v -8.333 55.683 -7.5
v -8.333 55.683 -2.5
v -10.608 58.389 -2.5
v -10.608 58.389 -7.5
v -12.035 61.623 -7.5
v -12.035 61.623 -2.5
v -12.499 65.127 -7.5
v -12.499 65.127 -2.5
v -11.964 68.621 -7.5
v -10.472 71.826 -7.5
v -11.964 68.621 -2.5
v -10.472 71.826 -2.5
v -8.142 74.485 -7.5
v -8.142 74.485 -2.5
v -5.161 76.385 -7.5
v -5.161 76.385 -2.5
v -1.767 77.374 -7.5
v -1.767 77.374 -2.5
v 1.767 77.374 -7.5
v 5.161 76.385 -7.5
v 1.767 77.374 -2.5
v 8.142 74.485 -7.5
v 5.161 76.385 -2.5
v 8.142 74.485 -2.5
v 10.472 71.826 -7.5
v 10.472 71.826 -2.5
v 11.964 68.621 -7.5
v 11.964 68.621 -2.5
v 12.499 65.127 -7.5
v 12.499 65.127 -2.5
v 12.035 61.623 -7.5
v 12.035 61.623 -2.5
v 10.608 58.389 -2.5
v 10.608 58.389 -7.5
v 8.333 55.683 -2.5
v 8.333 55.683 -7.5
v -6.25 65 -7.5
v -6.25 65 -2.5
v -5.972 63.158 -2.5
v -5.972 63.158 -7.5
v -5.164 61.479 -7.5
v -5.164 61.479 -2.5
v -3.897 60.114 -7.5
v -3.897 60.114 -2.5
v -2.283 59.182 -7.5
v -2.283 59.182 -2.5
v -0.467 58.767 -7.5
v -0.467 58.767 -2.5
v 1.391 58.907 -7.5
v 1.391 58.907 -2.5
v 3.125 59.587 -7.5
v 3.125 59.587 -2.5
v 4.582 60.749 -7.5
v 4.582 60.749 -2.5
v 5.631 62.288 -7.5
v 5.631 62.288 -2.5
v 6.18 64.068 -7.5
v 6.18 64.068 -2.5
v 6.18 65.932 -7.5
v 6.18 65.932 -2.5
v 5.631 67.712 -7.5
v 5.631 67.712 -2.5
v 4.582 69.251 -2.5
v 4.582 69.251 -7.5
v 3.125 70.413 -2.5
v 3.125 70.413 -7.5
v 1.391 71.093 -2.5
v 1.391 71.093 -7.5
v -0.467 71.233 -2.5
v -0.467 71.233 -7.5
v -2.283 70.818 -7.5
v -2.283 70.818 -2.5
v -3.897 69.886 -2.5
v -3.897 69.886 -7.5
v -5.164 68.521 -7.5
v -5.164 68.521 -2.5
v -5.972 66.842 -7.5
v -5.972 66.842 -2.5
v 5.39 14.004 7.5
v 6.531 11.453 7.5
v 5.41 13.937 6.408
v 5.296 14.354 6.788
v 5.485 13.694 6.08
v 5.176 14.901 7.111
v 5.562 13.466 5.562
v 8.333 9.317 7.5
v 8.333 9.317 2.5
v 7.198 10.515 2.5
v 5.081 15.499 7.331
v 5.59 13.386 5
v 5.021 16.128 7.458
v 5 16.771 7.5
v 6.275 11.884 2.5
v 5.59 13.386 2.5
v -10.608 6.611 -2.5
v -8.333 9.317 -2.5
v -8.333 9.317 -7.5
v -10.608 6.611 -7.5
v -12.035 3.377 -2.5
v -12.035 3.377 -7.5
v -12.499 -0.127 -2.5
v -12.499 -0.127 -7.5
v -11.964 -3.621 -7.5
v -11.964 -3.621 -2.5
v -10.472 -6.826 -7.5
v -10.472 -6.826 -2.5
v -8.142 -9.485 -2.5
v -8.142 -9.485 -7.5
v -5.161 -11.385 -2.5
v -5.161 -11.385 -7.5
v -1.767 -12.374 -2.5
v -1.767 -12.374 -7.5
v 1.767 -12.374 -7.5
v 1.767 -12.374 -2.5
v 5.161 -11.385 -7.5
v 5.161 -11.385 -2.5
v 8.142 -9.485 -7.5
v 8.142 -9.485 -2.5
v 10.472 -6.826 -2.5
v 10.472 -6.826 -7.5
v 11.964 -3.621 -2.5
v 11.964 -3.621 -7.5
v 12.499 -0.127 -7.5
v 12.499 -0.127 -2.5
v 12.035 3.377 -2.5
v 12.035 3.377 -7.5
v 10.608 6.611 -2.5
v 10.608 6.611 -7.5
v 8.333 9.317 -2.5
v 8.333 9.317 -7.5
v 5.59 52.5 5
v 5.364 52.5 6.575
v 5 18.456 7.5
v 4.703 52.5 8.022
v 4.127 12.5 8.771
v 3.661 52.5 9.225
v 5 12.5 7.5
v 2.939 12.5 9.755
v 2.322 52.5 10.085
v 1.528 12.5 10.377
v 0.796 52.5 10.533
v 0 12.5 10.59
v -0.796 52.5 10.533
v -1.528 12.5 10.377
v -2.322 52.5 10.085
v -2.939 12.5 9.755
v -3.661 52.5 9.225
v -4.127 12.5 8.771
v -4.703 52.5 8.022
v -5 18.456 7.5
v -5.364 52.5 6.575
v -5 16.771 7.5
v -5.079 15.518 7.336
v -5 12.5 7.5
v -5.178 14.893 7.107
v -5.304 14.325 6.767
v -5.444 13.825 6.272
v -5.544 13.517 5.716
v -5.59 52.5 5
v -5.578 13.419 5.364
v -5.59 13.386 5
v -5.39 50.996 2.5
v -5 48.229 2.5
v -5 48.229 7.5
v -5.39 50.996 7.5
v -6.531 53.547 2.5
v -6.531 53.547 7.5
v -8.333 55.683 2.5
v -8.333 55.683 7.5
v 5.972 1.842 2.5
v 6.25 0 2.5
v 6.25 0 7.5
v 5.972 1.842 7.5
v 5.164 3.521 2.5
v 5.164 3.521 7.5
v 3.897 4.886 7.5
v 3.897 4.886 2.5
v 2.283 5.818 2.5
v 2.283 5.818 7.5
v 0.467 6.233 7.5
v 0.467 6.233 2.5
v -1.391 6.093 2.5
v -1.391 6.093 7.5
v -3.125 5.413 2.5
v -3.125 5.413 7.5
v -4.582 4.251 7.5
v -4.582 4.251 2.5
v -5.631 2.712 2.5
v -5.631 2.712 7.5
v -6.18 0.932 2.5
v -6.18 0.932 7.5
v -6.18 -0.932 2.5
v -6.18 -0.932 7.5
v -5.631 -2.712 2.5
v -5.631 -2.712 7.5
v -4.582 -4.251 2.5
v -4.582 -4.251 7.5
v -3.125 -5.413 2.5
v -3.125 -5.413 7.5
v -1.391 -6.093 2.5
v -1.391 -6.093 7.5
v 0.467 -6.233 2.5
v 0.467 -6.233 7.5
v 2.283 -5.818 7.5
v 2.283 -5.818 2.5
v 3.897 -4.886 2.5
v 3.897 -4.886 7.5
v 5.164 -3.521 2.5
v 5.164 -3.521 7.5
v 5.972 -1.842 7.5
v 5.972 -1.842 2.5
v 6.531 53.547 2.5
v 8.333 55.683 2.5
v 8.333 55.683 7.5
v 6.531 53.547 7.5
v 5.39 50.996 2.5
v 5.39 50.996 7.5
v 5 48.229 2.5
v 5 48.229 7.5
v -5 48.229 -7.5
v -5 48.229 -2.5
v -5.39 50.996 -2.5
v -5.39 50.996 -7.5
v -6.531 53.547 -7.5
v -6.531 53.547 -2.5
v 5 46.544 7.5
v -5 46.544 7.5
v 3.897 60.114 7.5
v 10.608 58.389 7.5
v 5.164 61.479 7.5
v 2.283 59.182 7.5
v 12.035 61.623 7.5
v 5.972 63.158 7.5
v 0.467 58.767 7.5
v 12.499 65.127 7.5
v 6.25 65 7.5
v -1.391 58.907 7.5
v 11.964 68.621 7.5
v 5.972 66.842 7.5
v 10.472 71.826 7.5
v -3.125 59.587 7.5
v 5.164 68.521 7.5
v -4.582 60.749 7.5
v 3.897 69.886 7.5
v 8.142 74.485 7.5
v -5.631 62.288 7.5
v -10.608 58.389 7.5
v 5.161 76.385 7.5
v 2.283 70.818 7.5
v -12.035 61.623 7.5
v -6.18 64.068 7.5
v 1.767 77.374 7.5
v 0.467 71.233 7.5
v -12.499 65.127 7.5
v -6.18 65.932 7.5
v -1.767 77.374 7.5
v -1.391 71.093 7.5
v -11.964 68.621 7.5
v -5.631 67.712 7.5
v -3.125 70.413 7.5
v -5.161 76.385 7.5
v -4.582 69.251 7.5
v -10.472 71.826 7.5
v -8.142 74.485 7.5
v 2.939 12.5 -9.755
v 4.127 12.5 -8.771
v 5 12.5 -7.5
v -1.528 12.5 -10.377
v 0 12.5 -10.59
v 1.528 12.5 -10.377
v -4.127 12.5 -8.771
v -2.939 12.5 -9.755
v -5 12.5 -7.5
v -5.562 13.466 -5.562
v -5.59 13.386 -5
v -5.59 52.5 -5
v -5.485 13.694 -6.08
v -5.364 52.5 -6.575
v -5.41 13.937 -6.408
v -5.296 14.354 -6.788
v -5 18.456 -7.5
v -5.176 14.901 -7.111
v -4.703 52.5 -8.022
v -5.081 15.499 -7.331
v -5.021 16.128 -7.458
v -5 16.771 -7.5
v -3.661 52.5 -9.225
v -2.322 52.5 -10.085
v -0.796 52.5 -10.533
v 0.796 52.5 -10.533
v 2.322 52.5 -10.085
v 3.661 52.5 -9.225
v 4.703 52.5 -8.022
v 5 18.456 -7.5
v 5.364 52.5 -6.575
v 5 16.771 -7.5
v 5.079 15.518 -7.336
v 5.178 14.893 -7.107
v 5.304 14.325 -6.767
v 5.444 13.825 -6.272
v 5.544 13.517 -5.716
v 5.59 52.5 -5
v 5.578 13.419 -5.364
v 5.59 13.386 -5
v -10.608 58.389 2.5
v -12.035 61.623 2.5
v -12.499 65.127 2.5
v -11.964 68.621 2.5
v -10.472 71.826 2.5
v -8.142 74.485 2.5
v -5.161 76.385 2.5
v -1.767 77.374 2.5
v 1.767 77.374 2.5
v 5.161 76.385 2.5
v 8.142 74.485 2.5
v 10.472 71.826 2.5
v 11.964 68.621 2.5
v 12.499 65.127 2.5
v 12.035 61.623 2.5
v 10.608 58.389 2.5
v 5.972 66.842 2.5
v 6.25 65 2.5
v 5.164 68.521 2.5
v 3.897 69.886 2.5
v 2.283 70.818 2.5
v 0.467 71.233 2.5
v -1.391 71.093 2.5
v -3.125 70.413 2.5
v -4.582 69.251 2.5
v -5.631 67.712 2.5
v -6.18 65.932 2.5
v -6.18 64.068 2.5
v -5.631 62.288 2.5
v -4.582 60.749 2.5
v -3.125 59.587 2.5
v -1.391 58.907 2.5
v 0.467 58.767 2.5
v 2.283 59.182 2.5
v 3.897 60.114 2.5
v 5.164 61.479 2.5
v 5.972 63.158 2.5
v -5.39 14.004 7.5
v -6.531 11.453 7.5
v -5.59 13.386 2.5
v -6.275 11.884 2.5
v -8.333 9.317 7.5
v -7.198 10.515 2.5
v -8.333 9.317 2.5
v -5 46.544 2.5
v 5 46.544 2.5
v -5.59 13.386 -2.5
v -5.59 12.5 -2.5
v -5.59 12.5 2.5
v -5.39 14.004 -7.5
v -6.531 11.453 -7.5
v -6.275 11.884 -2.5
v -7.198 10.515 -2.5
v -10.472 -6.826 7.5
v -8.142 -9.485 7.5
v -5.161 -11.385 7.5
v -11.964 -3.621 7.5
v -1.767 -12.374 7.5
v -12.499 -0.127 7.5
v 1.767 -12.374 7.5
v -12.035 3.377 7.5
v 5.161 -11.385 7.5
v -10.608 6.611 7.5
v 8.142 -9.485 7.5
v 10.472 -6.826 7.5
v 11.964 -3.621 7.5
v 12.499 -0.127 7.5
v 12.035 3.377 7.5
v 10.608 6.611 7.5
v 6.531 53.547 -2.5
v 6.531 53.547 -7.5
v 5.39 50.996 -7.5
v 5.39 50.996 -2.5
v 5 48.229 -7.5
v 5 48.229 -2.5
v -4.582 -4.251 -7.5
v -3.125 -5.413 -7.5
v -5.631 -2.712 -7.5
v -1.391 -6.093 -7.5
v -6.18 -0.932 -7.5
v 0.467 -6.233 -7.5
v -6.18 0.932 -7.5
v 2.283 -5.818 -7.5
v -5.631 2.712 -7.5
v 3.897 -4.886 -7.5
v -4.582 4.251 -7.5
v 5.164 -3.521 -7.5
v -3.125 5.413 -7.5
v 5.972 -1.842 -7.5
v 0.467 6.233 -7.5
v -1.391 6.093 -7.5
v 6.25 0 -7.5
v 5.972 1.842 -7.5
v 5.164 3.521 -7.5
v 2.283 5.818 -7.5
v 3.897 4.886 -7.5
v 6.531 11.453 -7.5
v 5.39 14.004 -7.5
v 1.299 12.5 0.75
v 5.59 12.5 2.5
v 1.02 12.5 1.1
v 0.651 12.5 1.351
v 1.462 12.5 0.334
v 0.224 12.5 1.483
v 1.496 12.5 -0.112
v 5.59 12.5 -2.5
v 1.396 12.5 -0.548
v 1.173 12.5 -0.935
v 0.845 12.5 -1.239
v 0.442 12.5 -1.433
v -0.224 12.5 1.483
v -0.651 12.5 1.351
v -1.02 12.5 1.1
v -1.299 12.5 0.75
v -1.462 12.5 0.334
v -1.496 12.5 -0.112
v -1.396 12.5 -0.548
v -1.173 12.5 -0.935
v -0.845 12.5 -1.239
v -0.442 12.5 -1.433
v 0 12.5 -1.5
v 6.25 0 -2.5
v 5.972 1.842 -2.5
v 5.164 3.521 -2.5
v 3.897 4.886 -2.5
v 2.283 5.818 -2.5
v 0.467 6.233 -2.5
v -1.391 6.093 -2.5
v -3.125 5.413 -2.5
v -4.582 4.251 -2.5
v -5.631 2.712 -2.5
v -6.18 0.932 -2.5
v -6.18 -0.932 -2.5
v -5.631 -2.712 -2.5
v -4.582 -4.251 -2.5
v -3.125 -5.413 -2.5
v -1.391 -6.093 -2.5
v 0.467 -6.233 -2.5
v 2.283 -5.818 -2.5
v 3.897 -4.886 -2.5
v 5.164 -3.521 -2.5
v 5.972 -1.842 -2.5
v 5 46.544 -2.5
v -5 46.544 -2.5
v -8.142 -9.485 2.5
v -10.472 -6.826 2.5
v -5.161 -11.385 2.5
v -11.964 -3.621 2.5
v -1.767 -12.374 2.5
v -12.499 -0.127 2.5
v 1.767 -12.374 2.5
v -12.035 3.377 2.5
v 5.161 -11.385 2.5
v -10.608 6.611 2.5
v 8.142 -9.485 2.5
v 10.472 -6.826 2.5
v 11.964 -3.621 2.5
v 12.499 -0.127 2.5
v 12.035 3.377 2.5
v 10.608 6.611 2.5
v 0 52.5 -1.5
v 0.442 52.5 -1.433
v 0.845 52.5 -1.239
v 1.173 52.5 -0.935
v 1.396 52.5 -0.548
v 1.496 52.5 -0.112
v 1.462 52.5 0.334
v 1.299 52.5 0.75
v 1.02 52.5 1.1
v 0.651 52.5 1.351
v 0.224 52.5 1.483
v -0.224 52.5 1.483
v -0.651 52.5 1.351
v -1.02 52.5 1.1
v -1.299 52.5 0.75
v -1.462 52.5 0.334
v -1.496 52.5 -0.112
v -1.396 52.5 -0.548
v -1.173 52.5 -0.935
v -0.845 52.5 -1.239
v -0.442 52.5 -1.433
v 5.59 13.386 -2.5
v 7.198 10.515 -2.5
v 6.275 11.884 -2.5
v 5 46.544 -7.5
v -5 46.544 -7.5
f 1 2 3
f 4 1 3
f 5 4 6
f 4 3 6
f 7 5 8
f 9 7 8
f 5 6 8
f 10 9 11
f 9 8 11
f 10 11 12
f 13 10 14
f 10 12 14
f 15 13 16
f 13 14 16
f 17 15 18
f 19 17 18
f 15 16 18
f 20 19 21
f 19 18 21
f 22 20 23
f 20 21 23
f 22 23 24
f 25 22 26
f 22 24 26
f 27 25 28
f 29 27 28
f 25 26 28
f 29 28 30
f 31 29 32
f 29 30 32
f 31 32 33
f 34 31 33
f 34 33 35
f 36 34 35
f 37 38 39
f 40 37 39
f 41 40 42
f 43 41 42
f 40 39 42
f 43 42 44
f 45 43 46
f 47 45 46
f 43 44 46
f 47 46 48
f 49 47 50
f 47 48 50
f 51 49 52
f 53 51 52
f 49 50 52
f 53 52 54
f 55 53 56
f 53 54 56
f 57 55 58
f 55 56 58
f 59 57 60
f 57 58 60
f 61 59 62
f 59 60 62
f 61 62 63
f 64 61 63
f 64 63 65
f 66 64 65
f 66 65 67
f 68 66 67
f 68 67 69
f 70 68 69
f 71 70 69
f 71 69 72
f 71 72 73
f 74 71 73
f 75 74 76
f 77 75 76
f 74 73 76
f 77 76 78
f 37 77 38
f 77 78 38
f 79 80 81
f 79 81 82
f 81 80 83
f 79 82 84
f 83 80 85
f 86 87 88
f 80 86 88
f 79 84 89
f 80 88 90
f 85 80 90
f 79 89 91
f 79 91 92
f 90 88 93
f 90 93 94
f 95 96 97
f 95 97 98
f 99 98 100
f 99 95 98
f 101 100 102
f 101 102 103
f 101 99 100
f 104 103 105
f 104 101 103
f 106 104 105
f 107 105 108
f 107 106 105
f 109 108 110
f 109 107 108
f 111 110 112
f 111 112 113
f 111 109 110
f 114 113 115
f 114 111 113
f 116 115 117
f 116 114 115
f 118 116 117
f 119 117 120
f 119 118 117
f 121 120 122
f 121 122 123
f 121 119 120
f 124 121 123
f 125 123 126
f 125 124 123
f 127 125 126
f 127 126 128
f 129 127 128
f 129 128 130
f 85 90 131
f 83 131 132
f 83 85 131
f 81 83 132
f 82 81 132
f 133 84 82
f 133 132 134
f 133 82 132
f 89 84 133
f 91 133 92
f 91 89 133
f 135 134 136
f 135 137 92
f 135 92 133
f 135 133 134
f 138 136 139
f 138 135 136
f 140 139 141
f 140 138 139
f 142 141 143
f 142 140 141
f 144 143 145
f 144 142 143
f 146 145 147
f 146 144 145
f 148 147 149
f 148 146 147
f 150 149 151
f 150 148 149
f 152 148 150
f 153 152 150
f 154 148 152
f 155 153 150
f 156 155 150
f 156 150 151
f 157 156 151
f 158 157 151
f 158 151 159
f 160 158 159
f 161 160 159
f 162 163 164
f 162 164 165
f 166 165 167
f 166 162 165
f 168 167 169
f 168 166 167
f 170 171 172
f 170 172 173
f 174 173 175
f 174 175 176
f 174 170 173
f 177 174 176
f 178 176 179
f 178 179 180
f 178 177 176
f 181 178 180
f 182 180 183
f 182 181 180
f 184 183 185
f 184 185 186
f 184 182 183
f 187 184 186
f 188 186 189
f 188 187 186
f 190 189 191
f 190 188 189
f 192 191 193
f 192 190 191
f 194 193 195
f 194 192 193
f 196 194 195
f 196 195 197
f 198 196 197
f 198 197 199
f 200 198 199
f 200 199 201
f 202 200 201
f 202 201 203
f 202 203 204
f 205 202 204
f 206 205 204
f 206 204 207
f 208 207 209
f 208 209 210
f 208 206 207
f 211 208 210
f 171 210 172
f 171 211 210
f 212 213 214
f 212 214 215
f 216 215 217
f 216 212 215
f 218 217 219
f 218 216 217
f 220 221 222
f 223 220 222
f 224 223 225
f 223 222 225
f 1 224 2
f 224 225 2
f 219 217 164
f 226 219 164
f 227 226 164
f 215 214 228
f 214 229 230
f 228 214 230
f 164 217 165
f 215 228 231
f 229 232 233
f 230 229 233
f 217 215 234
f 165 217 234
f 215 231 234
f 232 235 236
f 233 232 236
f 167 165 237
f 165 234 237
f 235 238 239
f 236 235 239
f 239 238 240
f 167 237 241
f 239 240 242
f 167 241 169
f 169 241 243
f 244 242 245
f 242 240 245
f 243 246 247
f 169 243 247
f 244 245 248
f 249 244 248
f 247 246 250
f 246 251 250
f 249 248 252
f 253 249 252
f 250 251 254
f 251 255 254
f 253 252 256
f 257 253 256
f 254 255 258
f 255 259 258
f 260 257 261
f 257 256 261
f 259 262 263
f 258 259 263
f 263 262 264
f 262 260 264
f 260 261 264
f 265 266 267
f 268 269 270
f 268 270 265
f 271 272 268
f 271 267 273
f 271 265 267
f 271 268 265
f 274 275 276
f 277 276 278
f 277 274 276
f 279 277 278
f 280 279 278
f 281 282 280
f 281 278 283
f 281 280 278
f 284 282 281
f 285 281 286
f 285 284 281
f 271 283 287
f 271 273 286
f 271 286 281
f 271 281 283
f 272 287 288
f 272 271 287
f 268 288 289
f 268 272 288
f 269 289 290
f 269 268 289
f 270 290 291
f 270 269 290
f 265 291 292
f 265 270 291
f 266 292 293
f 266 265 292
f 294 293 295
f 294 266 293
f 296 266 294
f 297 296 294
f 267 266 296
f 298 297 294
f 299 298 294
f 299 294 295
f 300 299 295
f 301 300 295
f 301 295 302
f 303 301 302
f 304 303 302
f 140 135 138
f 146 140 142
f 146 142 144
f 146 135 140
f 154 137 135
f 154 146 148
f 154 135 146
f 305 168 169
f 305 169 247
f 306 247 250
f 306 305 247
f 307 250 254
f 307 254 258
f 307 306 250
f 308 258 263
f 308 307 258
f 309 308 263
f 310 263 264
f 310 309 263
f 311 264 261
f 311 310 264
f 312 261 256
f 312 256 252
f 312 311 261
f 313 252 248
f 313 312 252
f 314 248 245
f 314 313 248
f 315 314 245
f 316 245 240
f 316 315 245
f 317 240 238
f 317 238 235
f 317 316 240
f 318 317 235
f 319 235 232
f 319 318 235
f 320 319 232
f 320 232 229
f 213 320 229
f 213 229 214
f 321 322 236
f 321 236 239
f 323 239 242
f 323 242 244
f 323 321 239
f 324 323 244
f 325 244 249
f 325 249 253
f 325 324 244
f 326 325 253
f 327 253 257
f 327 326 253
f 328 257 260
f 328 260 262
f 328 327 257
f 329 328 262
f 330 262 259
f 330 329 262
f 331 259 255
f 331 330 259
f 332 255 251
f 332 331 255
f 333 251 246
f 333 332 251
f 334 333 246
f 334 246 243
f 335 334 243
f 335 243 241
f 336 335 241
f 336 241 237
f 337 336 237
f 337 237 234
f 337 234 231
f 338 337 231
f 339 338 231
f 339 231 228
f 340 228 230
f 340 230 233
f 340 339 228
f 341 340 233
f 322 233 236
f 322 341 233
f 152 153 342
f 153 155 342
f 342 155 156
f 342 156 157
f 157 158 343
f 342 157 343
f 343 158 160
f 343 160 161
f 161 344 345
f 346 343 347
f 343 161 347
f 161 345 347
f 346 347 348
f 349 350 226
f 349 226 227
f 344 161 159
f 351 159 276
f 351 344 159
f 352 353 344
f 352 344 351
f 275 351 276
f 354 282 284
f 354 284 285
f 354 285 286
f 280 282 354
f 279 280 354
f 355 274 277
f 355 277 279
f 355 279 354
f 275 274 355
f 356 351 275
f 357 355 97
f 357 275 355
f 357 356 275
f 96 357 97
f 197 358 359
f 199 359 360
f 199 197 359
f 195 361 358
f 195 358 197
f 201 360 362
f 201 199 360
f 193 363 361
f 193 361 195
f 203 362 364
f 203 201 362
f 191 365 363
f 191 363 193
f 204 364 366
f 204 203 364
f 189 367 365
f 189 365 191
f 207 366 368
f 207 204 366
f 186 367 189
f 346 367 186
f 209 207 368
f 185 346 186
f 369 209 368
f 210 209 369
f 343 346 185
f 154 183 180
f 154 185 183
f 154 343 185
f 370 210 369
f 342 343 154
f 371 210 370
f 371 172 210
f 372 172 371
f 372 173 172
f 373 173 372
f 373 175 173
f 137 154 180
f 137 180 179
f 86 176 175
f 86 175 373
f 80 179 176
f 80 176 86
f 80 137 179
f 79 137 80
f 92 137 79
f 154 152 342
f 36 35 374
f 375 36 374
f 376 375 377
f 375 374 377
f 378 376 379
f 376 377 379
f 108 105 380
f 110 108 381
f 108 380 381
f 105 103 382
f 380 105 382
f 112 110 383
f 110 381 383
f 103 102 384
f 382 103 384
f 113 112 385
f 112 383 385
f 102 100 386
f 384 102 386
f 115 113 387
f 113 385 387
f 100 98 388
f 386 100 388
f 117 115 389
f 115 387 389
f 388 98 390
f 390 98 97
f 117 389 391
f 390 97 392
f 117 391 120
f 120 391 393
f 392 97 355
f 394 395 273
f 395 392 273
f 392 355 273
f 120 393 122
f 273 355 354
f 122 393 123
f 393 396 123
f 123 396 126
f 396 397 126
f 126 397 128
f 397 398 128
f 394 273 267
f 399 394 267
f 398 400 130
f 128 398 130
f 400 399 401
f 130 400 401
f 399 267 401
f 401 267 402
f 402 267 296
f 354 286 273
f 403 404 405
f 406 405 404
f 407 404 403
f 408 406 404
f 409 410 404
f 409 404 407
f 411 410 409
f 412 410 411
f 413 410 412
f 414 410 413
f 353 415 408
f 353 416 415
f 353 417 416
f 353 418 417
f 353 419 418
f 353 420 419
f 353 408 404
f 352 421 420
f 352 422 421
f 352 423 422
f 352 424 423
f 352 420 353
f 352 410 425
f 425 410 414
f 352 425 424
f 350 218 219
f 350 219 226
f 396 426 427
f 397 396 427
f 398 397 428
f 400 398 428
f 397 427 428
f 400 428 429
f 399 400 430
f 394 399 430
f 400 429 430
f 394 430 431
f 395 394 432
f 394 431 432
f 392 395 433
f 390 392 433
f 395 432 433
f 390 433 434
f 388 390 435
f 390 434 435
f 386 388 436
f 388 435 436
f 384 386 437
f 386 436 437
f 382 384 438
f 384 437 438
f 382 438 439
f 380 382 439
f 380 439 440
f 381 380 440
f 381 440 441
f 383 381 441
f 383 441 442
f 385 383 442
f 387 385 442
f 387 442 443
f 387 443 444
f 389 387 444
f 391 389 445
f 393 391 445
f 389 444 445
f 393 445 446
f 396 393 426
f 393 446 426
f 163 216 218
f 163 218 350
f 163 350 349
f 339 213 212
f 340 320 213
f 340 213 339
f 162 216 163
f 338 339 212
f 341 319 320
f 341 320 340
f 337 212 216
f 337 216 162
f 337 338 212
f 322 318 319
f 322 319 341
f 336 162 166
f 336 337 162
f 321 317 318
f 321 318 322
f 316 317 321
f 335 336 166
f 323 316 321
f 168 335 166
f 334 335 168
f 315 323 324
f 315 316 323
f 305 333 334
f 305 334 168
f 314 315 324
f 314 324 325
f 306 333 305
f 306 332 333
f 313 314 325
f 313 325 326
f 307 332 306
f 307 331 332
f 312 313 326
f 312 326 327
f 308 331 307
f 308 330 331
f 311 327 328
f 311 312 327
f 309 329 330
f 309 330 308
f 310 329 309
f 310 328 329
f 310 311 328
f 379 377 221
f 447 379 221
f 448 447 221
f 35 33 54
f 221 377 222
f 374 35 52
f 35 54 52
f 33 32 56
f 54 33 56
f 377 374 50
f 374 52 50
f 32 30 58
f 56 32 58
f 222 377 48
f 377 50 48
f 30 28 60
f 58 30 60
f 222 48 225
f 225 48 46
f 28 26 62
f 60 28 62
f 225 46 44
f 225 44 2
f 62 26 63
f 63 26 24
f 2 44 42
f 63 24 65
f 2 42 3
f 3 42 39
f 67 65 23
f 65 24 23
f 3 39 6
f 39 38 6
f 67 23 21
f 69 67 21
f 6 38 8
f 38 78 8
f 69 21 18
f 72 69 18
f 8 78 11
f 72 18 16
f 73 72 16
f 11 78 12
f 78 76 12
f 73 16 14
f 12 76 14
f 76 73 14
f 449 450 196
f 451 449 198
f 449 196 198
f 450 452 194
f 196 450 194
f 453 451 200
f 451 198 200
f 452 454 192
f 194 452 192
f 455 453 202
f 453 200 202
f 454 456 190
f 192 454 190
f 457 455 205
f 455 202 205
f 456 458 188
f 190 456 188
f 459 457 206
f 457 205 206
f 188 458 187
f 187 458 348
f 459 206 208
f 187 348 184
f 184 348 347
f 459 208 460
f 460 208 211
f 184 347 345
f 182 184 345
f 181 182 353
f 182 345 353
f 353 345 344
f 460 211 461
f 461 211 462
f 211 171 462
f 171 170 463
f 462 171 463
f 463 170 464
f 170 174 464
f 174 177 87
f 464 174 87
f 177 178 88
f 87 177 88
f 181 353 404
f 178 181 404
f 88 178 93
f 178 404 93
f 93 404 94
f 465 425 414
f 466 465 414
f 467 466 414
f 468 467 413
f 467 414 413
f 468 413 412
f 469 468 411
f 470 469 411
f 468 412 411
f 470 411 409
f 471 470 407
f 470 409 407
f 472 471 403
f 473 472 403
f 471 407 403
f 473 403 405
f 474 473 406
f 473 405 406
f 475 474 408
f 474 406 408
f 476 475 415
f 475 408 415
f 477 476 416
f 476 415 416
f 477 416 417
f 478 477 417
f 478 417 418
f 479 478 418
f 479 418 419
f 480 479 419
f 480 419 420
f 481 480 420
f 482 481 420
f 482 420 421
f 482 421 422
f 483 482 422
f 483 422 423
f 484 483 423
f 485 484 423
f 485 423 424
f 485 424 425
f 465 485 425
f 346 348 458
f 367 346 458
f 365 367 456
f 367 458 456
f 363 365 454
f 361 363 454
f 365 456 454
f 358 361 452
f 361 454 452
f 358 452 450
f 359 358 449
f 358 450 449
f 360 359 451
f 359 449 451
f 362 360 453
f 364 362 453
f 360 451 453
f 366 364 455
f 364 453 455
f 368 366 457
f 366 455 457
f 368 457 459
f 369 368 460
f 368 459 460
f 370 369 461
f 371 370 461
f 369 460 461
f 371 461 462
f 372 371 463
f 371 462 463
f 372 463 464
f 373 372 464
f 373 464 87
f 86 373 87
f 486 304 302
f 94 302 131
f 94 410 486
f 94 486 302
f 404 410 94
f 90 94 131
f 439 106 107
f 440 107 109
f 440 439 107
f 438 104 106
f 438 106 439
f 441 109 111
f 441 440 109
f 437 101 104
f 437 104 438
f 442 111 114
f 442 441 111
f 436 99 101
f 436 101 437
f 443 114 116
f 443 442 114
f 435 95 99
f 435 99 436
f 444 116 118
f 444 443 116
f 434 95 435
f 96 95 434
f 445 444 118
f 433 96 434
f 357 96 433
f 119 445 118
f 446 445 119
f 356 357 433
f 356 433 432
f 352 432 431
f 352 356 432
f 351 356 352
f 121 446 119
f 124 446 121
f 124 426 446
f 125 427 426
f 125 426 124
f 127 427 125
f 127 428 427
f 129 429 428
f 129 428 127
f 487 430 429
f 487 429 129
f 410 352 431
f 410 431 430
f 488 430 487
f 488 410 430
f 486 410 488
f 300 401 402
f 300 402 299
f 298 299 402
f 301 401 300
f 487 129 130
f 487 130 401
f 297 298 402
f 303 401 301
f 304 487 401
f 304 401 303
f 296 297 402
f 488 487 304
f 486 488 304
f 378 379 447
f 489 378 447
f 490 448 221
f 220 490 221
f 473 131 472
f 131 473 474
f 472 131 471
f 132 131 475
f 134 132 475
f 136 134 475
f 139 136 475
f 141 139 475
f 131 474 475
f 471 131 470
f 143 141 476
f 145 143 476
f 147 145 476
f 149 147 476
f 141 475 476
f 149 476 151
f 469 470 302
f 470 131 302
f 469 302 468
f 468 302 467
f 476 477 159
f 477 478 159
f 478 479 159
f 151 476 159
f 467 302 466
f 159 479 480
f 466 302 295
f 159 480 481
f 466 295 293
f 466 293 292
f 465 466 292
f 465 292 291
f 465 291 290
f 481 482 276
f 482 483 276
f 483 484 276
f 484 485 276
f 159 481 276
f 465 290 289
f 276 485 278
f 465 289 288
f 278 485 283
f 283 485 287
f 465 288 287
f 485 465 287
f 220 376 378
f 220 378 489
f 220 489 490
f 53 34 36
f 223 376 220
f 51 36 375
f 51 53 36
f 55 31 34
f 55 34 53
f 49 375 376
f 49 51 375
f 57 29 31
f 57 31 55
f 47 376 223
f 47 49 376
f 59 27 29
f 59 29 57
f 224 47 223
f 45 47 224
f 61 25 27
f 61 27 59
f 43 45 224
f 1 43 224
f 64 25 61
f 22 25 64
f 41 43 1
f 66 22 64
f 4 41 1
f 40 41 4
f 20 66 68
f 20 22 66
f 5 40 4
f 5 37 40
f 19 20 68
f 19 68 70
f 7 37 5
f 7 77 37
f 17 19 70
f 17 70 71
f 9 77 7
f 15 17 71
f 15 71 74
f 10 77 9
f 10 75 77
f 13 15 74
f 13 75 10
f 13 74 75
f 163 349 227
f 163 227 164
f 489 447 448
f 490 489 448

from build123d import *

# Parameters (mm, degrees)
BOSS_EXTRUDE1_START   = 2.5
SKETCH1_R             = 6.25
BOSS_EXTRUDE1_DEPTH   = 5
BOSS_EXTRUDE1_2_DEPTH = 5
BOSS_EXTRUDE2_START   = -2.5
SKETCH1_2_R           = 6.25
BOSS_EXTRUDE2_DEPTH   = 5
BOSS_EXTRUDE2_2_DEPTH = 5
BOSS_EXTRUDE3_START   = 12.5
BOSS_EXTRUDE3_DEPTH   = 40
SKETCH3_R             = 1.5
CUT_EXTRUDE1_DEPTH    = 64


with BuildPart() as part:
    # Sketch1 → Boss-Extrude1 (new body)
    with BuildSketch(Plane.XY.offset(BOSS_EXTRUDE1_START)):
        with BuildLine():
            Line((5, 16.770509831), (5, 18.456439237))
            Line((5, 18.456439237), (-5, 18.456439237))
            Line((-5, 18.456439237), (-5, 16.770509831))
            ThreePointArc((-5, 16.770509831), (-5.871290708, 12.688026927), (-8.333333333, 9.316949906))
            ThreePointArc((-8.333333333, 9.316949906), (0, -12.5), (8.333333333, 9.316949906))
            ThreePointArc((8.333333333, 9.316949906), (5.871290708, 12.688026927), (5, 16.770509831))
        make_face()
        Circle(SKETCH1_R, mode=Mode.SUBTRACT)
    extrude(amount=BOSS_EXTRUDE1_DEPTH)



with BuildPart() as body_2:
    # Sketch1 → Boss-Extrude1 2 (new body)
    with BuildSketch(Plane.XY.offset(BOSS_EXTRUDE1_START)):
        with BuildLine():
            Line((-5, 48.229490169), (-5, 46.543560763))
            Line((-5, 46.543560763), (5, 46.543560763))
            Line((5, 46.543560763), (5, 48.229490169))
            ThreePointArc((5, 48.229490169), (5.871290708, 52.311973073), (8.333333333, 55.683050094))
            ThreePointArc((8.333333333, 55.683050094), (0, 77.5), (-8.333333333, 55.683050094))
            ThreePointArc((-8.333333333, 55.683050094), (-5.871290708, 52.311973073), (-5, 48.229490169))
        make_face()
        with Locations((0, 65)):
            Circle(SKETCH1_R, mode=Mode.SUBTRACT)
    extrude(amount=BOSS_EXTRUDE1_2_DEPTH)


with BuildPart() as body_3:
    # Sketch1<2> → Boss-Extrude2 (new body)
    with BuildSketch(Plane.XY.offset(BOSS_EXTRUDE2_START)):
        with BuildLine():
            Line((5, 16.770509831), (5, 18.456439237))
            Line((5, 18.456439237), (-5, 18.456439237))
            Line((-5, 18.456439237), (-5, 16.770509831))
            ThreePointArc((-5, 16.770509831), (-5.871290708, 12.688026927), (-8.333333333, 9.316949906))
            ThreePointArc((-8.333333333, 9.316949906), (0, -12.5), (8.333333333, 9.316949906))
            ThreePointArc((8.333333333, 9.316949906), (5.871290708, 12.688026927), (5, 16.770509831))
        make_face()
        Circle(SKETCH1_2_R, mode=Mode.SUBTRACT)
    extrude(amount=-BOSS_EXTRUDE2_DEPTH)


with BuildPart() as body_4:
    # Sketch1<2> → Boss-Extrude2 2 (new body)
    with BuildSketch(Plane.XY.offset(BOSS_EXTRUDE2_START)):
        with BuildLine():
            Line((-5, 48.229490169), (-5, 46.543560763))
            Line((-5, 46.543560763), (5, 46.543560763))
            Line((5, 46.543560763), (5, 48.229490169))
            ThreePointArc((5, 48.229490169), (5.871290708, 52.311973073), (8.333333333, 55.683050094))
            ThreePointArc((8.333333333, 55.683050094), (0, 77.5), (-8.333333333, 55.683050094))
            ThreePointArc((-8.333333333, 55.683050094), (-5.871290708, 52.311973073), (-5, 48.229490169))
        make_face()
        with Locations((0, 65)):
            Circle(SKETCH1_2_R, mode=Mode.SUBTRACT)
    extrude(amount=-BOSS_EXTRUDE2_2_DEPTH)


with BuildPart() as part_1:
    add(part.part)

    add(body_3.part)  # Boss-Extrude3 merges body 3
    # Sketch2 → Boss-Extrude3 (add)
    with BuildSketch(Plane(origin=(0, 0, 0), x_dir=(1, 0, 0), z_dir=(0, 1, 0)).offset(BOSS_EXTRUDE3_START)):
        with BuildLine():
            Line((5.590169944, 5), (5.590169944, -5))
            ThreePointArc((5.590169944, -5), (0, -10.590169944), (-5.590169944, -5))
            Line((-5.590169944, -5), (-5.590169944, 5))
            ThreePointArc((-5.590169944, 5), (0, 10.590169944), (5.590169944, 5))
        make_face()
    extrude(amount=BOSS_EXTRUDE3_DEPTH)

    # Sketch3 → Cut-Extrude1 (cut)
    with BuildSketch(Plane.XZ.offset(-12.5)):
        Circle(SKETCH3_R)
    extrude(amount=-CUT_EXTRUDE1_DEPTH, mode=Mode.SUBTRACT)


solid = Compound([body_2.part, body_4.part, part_1.part])
